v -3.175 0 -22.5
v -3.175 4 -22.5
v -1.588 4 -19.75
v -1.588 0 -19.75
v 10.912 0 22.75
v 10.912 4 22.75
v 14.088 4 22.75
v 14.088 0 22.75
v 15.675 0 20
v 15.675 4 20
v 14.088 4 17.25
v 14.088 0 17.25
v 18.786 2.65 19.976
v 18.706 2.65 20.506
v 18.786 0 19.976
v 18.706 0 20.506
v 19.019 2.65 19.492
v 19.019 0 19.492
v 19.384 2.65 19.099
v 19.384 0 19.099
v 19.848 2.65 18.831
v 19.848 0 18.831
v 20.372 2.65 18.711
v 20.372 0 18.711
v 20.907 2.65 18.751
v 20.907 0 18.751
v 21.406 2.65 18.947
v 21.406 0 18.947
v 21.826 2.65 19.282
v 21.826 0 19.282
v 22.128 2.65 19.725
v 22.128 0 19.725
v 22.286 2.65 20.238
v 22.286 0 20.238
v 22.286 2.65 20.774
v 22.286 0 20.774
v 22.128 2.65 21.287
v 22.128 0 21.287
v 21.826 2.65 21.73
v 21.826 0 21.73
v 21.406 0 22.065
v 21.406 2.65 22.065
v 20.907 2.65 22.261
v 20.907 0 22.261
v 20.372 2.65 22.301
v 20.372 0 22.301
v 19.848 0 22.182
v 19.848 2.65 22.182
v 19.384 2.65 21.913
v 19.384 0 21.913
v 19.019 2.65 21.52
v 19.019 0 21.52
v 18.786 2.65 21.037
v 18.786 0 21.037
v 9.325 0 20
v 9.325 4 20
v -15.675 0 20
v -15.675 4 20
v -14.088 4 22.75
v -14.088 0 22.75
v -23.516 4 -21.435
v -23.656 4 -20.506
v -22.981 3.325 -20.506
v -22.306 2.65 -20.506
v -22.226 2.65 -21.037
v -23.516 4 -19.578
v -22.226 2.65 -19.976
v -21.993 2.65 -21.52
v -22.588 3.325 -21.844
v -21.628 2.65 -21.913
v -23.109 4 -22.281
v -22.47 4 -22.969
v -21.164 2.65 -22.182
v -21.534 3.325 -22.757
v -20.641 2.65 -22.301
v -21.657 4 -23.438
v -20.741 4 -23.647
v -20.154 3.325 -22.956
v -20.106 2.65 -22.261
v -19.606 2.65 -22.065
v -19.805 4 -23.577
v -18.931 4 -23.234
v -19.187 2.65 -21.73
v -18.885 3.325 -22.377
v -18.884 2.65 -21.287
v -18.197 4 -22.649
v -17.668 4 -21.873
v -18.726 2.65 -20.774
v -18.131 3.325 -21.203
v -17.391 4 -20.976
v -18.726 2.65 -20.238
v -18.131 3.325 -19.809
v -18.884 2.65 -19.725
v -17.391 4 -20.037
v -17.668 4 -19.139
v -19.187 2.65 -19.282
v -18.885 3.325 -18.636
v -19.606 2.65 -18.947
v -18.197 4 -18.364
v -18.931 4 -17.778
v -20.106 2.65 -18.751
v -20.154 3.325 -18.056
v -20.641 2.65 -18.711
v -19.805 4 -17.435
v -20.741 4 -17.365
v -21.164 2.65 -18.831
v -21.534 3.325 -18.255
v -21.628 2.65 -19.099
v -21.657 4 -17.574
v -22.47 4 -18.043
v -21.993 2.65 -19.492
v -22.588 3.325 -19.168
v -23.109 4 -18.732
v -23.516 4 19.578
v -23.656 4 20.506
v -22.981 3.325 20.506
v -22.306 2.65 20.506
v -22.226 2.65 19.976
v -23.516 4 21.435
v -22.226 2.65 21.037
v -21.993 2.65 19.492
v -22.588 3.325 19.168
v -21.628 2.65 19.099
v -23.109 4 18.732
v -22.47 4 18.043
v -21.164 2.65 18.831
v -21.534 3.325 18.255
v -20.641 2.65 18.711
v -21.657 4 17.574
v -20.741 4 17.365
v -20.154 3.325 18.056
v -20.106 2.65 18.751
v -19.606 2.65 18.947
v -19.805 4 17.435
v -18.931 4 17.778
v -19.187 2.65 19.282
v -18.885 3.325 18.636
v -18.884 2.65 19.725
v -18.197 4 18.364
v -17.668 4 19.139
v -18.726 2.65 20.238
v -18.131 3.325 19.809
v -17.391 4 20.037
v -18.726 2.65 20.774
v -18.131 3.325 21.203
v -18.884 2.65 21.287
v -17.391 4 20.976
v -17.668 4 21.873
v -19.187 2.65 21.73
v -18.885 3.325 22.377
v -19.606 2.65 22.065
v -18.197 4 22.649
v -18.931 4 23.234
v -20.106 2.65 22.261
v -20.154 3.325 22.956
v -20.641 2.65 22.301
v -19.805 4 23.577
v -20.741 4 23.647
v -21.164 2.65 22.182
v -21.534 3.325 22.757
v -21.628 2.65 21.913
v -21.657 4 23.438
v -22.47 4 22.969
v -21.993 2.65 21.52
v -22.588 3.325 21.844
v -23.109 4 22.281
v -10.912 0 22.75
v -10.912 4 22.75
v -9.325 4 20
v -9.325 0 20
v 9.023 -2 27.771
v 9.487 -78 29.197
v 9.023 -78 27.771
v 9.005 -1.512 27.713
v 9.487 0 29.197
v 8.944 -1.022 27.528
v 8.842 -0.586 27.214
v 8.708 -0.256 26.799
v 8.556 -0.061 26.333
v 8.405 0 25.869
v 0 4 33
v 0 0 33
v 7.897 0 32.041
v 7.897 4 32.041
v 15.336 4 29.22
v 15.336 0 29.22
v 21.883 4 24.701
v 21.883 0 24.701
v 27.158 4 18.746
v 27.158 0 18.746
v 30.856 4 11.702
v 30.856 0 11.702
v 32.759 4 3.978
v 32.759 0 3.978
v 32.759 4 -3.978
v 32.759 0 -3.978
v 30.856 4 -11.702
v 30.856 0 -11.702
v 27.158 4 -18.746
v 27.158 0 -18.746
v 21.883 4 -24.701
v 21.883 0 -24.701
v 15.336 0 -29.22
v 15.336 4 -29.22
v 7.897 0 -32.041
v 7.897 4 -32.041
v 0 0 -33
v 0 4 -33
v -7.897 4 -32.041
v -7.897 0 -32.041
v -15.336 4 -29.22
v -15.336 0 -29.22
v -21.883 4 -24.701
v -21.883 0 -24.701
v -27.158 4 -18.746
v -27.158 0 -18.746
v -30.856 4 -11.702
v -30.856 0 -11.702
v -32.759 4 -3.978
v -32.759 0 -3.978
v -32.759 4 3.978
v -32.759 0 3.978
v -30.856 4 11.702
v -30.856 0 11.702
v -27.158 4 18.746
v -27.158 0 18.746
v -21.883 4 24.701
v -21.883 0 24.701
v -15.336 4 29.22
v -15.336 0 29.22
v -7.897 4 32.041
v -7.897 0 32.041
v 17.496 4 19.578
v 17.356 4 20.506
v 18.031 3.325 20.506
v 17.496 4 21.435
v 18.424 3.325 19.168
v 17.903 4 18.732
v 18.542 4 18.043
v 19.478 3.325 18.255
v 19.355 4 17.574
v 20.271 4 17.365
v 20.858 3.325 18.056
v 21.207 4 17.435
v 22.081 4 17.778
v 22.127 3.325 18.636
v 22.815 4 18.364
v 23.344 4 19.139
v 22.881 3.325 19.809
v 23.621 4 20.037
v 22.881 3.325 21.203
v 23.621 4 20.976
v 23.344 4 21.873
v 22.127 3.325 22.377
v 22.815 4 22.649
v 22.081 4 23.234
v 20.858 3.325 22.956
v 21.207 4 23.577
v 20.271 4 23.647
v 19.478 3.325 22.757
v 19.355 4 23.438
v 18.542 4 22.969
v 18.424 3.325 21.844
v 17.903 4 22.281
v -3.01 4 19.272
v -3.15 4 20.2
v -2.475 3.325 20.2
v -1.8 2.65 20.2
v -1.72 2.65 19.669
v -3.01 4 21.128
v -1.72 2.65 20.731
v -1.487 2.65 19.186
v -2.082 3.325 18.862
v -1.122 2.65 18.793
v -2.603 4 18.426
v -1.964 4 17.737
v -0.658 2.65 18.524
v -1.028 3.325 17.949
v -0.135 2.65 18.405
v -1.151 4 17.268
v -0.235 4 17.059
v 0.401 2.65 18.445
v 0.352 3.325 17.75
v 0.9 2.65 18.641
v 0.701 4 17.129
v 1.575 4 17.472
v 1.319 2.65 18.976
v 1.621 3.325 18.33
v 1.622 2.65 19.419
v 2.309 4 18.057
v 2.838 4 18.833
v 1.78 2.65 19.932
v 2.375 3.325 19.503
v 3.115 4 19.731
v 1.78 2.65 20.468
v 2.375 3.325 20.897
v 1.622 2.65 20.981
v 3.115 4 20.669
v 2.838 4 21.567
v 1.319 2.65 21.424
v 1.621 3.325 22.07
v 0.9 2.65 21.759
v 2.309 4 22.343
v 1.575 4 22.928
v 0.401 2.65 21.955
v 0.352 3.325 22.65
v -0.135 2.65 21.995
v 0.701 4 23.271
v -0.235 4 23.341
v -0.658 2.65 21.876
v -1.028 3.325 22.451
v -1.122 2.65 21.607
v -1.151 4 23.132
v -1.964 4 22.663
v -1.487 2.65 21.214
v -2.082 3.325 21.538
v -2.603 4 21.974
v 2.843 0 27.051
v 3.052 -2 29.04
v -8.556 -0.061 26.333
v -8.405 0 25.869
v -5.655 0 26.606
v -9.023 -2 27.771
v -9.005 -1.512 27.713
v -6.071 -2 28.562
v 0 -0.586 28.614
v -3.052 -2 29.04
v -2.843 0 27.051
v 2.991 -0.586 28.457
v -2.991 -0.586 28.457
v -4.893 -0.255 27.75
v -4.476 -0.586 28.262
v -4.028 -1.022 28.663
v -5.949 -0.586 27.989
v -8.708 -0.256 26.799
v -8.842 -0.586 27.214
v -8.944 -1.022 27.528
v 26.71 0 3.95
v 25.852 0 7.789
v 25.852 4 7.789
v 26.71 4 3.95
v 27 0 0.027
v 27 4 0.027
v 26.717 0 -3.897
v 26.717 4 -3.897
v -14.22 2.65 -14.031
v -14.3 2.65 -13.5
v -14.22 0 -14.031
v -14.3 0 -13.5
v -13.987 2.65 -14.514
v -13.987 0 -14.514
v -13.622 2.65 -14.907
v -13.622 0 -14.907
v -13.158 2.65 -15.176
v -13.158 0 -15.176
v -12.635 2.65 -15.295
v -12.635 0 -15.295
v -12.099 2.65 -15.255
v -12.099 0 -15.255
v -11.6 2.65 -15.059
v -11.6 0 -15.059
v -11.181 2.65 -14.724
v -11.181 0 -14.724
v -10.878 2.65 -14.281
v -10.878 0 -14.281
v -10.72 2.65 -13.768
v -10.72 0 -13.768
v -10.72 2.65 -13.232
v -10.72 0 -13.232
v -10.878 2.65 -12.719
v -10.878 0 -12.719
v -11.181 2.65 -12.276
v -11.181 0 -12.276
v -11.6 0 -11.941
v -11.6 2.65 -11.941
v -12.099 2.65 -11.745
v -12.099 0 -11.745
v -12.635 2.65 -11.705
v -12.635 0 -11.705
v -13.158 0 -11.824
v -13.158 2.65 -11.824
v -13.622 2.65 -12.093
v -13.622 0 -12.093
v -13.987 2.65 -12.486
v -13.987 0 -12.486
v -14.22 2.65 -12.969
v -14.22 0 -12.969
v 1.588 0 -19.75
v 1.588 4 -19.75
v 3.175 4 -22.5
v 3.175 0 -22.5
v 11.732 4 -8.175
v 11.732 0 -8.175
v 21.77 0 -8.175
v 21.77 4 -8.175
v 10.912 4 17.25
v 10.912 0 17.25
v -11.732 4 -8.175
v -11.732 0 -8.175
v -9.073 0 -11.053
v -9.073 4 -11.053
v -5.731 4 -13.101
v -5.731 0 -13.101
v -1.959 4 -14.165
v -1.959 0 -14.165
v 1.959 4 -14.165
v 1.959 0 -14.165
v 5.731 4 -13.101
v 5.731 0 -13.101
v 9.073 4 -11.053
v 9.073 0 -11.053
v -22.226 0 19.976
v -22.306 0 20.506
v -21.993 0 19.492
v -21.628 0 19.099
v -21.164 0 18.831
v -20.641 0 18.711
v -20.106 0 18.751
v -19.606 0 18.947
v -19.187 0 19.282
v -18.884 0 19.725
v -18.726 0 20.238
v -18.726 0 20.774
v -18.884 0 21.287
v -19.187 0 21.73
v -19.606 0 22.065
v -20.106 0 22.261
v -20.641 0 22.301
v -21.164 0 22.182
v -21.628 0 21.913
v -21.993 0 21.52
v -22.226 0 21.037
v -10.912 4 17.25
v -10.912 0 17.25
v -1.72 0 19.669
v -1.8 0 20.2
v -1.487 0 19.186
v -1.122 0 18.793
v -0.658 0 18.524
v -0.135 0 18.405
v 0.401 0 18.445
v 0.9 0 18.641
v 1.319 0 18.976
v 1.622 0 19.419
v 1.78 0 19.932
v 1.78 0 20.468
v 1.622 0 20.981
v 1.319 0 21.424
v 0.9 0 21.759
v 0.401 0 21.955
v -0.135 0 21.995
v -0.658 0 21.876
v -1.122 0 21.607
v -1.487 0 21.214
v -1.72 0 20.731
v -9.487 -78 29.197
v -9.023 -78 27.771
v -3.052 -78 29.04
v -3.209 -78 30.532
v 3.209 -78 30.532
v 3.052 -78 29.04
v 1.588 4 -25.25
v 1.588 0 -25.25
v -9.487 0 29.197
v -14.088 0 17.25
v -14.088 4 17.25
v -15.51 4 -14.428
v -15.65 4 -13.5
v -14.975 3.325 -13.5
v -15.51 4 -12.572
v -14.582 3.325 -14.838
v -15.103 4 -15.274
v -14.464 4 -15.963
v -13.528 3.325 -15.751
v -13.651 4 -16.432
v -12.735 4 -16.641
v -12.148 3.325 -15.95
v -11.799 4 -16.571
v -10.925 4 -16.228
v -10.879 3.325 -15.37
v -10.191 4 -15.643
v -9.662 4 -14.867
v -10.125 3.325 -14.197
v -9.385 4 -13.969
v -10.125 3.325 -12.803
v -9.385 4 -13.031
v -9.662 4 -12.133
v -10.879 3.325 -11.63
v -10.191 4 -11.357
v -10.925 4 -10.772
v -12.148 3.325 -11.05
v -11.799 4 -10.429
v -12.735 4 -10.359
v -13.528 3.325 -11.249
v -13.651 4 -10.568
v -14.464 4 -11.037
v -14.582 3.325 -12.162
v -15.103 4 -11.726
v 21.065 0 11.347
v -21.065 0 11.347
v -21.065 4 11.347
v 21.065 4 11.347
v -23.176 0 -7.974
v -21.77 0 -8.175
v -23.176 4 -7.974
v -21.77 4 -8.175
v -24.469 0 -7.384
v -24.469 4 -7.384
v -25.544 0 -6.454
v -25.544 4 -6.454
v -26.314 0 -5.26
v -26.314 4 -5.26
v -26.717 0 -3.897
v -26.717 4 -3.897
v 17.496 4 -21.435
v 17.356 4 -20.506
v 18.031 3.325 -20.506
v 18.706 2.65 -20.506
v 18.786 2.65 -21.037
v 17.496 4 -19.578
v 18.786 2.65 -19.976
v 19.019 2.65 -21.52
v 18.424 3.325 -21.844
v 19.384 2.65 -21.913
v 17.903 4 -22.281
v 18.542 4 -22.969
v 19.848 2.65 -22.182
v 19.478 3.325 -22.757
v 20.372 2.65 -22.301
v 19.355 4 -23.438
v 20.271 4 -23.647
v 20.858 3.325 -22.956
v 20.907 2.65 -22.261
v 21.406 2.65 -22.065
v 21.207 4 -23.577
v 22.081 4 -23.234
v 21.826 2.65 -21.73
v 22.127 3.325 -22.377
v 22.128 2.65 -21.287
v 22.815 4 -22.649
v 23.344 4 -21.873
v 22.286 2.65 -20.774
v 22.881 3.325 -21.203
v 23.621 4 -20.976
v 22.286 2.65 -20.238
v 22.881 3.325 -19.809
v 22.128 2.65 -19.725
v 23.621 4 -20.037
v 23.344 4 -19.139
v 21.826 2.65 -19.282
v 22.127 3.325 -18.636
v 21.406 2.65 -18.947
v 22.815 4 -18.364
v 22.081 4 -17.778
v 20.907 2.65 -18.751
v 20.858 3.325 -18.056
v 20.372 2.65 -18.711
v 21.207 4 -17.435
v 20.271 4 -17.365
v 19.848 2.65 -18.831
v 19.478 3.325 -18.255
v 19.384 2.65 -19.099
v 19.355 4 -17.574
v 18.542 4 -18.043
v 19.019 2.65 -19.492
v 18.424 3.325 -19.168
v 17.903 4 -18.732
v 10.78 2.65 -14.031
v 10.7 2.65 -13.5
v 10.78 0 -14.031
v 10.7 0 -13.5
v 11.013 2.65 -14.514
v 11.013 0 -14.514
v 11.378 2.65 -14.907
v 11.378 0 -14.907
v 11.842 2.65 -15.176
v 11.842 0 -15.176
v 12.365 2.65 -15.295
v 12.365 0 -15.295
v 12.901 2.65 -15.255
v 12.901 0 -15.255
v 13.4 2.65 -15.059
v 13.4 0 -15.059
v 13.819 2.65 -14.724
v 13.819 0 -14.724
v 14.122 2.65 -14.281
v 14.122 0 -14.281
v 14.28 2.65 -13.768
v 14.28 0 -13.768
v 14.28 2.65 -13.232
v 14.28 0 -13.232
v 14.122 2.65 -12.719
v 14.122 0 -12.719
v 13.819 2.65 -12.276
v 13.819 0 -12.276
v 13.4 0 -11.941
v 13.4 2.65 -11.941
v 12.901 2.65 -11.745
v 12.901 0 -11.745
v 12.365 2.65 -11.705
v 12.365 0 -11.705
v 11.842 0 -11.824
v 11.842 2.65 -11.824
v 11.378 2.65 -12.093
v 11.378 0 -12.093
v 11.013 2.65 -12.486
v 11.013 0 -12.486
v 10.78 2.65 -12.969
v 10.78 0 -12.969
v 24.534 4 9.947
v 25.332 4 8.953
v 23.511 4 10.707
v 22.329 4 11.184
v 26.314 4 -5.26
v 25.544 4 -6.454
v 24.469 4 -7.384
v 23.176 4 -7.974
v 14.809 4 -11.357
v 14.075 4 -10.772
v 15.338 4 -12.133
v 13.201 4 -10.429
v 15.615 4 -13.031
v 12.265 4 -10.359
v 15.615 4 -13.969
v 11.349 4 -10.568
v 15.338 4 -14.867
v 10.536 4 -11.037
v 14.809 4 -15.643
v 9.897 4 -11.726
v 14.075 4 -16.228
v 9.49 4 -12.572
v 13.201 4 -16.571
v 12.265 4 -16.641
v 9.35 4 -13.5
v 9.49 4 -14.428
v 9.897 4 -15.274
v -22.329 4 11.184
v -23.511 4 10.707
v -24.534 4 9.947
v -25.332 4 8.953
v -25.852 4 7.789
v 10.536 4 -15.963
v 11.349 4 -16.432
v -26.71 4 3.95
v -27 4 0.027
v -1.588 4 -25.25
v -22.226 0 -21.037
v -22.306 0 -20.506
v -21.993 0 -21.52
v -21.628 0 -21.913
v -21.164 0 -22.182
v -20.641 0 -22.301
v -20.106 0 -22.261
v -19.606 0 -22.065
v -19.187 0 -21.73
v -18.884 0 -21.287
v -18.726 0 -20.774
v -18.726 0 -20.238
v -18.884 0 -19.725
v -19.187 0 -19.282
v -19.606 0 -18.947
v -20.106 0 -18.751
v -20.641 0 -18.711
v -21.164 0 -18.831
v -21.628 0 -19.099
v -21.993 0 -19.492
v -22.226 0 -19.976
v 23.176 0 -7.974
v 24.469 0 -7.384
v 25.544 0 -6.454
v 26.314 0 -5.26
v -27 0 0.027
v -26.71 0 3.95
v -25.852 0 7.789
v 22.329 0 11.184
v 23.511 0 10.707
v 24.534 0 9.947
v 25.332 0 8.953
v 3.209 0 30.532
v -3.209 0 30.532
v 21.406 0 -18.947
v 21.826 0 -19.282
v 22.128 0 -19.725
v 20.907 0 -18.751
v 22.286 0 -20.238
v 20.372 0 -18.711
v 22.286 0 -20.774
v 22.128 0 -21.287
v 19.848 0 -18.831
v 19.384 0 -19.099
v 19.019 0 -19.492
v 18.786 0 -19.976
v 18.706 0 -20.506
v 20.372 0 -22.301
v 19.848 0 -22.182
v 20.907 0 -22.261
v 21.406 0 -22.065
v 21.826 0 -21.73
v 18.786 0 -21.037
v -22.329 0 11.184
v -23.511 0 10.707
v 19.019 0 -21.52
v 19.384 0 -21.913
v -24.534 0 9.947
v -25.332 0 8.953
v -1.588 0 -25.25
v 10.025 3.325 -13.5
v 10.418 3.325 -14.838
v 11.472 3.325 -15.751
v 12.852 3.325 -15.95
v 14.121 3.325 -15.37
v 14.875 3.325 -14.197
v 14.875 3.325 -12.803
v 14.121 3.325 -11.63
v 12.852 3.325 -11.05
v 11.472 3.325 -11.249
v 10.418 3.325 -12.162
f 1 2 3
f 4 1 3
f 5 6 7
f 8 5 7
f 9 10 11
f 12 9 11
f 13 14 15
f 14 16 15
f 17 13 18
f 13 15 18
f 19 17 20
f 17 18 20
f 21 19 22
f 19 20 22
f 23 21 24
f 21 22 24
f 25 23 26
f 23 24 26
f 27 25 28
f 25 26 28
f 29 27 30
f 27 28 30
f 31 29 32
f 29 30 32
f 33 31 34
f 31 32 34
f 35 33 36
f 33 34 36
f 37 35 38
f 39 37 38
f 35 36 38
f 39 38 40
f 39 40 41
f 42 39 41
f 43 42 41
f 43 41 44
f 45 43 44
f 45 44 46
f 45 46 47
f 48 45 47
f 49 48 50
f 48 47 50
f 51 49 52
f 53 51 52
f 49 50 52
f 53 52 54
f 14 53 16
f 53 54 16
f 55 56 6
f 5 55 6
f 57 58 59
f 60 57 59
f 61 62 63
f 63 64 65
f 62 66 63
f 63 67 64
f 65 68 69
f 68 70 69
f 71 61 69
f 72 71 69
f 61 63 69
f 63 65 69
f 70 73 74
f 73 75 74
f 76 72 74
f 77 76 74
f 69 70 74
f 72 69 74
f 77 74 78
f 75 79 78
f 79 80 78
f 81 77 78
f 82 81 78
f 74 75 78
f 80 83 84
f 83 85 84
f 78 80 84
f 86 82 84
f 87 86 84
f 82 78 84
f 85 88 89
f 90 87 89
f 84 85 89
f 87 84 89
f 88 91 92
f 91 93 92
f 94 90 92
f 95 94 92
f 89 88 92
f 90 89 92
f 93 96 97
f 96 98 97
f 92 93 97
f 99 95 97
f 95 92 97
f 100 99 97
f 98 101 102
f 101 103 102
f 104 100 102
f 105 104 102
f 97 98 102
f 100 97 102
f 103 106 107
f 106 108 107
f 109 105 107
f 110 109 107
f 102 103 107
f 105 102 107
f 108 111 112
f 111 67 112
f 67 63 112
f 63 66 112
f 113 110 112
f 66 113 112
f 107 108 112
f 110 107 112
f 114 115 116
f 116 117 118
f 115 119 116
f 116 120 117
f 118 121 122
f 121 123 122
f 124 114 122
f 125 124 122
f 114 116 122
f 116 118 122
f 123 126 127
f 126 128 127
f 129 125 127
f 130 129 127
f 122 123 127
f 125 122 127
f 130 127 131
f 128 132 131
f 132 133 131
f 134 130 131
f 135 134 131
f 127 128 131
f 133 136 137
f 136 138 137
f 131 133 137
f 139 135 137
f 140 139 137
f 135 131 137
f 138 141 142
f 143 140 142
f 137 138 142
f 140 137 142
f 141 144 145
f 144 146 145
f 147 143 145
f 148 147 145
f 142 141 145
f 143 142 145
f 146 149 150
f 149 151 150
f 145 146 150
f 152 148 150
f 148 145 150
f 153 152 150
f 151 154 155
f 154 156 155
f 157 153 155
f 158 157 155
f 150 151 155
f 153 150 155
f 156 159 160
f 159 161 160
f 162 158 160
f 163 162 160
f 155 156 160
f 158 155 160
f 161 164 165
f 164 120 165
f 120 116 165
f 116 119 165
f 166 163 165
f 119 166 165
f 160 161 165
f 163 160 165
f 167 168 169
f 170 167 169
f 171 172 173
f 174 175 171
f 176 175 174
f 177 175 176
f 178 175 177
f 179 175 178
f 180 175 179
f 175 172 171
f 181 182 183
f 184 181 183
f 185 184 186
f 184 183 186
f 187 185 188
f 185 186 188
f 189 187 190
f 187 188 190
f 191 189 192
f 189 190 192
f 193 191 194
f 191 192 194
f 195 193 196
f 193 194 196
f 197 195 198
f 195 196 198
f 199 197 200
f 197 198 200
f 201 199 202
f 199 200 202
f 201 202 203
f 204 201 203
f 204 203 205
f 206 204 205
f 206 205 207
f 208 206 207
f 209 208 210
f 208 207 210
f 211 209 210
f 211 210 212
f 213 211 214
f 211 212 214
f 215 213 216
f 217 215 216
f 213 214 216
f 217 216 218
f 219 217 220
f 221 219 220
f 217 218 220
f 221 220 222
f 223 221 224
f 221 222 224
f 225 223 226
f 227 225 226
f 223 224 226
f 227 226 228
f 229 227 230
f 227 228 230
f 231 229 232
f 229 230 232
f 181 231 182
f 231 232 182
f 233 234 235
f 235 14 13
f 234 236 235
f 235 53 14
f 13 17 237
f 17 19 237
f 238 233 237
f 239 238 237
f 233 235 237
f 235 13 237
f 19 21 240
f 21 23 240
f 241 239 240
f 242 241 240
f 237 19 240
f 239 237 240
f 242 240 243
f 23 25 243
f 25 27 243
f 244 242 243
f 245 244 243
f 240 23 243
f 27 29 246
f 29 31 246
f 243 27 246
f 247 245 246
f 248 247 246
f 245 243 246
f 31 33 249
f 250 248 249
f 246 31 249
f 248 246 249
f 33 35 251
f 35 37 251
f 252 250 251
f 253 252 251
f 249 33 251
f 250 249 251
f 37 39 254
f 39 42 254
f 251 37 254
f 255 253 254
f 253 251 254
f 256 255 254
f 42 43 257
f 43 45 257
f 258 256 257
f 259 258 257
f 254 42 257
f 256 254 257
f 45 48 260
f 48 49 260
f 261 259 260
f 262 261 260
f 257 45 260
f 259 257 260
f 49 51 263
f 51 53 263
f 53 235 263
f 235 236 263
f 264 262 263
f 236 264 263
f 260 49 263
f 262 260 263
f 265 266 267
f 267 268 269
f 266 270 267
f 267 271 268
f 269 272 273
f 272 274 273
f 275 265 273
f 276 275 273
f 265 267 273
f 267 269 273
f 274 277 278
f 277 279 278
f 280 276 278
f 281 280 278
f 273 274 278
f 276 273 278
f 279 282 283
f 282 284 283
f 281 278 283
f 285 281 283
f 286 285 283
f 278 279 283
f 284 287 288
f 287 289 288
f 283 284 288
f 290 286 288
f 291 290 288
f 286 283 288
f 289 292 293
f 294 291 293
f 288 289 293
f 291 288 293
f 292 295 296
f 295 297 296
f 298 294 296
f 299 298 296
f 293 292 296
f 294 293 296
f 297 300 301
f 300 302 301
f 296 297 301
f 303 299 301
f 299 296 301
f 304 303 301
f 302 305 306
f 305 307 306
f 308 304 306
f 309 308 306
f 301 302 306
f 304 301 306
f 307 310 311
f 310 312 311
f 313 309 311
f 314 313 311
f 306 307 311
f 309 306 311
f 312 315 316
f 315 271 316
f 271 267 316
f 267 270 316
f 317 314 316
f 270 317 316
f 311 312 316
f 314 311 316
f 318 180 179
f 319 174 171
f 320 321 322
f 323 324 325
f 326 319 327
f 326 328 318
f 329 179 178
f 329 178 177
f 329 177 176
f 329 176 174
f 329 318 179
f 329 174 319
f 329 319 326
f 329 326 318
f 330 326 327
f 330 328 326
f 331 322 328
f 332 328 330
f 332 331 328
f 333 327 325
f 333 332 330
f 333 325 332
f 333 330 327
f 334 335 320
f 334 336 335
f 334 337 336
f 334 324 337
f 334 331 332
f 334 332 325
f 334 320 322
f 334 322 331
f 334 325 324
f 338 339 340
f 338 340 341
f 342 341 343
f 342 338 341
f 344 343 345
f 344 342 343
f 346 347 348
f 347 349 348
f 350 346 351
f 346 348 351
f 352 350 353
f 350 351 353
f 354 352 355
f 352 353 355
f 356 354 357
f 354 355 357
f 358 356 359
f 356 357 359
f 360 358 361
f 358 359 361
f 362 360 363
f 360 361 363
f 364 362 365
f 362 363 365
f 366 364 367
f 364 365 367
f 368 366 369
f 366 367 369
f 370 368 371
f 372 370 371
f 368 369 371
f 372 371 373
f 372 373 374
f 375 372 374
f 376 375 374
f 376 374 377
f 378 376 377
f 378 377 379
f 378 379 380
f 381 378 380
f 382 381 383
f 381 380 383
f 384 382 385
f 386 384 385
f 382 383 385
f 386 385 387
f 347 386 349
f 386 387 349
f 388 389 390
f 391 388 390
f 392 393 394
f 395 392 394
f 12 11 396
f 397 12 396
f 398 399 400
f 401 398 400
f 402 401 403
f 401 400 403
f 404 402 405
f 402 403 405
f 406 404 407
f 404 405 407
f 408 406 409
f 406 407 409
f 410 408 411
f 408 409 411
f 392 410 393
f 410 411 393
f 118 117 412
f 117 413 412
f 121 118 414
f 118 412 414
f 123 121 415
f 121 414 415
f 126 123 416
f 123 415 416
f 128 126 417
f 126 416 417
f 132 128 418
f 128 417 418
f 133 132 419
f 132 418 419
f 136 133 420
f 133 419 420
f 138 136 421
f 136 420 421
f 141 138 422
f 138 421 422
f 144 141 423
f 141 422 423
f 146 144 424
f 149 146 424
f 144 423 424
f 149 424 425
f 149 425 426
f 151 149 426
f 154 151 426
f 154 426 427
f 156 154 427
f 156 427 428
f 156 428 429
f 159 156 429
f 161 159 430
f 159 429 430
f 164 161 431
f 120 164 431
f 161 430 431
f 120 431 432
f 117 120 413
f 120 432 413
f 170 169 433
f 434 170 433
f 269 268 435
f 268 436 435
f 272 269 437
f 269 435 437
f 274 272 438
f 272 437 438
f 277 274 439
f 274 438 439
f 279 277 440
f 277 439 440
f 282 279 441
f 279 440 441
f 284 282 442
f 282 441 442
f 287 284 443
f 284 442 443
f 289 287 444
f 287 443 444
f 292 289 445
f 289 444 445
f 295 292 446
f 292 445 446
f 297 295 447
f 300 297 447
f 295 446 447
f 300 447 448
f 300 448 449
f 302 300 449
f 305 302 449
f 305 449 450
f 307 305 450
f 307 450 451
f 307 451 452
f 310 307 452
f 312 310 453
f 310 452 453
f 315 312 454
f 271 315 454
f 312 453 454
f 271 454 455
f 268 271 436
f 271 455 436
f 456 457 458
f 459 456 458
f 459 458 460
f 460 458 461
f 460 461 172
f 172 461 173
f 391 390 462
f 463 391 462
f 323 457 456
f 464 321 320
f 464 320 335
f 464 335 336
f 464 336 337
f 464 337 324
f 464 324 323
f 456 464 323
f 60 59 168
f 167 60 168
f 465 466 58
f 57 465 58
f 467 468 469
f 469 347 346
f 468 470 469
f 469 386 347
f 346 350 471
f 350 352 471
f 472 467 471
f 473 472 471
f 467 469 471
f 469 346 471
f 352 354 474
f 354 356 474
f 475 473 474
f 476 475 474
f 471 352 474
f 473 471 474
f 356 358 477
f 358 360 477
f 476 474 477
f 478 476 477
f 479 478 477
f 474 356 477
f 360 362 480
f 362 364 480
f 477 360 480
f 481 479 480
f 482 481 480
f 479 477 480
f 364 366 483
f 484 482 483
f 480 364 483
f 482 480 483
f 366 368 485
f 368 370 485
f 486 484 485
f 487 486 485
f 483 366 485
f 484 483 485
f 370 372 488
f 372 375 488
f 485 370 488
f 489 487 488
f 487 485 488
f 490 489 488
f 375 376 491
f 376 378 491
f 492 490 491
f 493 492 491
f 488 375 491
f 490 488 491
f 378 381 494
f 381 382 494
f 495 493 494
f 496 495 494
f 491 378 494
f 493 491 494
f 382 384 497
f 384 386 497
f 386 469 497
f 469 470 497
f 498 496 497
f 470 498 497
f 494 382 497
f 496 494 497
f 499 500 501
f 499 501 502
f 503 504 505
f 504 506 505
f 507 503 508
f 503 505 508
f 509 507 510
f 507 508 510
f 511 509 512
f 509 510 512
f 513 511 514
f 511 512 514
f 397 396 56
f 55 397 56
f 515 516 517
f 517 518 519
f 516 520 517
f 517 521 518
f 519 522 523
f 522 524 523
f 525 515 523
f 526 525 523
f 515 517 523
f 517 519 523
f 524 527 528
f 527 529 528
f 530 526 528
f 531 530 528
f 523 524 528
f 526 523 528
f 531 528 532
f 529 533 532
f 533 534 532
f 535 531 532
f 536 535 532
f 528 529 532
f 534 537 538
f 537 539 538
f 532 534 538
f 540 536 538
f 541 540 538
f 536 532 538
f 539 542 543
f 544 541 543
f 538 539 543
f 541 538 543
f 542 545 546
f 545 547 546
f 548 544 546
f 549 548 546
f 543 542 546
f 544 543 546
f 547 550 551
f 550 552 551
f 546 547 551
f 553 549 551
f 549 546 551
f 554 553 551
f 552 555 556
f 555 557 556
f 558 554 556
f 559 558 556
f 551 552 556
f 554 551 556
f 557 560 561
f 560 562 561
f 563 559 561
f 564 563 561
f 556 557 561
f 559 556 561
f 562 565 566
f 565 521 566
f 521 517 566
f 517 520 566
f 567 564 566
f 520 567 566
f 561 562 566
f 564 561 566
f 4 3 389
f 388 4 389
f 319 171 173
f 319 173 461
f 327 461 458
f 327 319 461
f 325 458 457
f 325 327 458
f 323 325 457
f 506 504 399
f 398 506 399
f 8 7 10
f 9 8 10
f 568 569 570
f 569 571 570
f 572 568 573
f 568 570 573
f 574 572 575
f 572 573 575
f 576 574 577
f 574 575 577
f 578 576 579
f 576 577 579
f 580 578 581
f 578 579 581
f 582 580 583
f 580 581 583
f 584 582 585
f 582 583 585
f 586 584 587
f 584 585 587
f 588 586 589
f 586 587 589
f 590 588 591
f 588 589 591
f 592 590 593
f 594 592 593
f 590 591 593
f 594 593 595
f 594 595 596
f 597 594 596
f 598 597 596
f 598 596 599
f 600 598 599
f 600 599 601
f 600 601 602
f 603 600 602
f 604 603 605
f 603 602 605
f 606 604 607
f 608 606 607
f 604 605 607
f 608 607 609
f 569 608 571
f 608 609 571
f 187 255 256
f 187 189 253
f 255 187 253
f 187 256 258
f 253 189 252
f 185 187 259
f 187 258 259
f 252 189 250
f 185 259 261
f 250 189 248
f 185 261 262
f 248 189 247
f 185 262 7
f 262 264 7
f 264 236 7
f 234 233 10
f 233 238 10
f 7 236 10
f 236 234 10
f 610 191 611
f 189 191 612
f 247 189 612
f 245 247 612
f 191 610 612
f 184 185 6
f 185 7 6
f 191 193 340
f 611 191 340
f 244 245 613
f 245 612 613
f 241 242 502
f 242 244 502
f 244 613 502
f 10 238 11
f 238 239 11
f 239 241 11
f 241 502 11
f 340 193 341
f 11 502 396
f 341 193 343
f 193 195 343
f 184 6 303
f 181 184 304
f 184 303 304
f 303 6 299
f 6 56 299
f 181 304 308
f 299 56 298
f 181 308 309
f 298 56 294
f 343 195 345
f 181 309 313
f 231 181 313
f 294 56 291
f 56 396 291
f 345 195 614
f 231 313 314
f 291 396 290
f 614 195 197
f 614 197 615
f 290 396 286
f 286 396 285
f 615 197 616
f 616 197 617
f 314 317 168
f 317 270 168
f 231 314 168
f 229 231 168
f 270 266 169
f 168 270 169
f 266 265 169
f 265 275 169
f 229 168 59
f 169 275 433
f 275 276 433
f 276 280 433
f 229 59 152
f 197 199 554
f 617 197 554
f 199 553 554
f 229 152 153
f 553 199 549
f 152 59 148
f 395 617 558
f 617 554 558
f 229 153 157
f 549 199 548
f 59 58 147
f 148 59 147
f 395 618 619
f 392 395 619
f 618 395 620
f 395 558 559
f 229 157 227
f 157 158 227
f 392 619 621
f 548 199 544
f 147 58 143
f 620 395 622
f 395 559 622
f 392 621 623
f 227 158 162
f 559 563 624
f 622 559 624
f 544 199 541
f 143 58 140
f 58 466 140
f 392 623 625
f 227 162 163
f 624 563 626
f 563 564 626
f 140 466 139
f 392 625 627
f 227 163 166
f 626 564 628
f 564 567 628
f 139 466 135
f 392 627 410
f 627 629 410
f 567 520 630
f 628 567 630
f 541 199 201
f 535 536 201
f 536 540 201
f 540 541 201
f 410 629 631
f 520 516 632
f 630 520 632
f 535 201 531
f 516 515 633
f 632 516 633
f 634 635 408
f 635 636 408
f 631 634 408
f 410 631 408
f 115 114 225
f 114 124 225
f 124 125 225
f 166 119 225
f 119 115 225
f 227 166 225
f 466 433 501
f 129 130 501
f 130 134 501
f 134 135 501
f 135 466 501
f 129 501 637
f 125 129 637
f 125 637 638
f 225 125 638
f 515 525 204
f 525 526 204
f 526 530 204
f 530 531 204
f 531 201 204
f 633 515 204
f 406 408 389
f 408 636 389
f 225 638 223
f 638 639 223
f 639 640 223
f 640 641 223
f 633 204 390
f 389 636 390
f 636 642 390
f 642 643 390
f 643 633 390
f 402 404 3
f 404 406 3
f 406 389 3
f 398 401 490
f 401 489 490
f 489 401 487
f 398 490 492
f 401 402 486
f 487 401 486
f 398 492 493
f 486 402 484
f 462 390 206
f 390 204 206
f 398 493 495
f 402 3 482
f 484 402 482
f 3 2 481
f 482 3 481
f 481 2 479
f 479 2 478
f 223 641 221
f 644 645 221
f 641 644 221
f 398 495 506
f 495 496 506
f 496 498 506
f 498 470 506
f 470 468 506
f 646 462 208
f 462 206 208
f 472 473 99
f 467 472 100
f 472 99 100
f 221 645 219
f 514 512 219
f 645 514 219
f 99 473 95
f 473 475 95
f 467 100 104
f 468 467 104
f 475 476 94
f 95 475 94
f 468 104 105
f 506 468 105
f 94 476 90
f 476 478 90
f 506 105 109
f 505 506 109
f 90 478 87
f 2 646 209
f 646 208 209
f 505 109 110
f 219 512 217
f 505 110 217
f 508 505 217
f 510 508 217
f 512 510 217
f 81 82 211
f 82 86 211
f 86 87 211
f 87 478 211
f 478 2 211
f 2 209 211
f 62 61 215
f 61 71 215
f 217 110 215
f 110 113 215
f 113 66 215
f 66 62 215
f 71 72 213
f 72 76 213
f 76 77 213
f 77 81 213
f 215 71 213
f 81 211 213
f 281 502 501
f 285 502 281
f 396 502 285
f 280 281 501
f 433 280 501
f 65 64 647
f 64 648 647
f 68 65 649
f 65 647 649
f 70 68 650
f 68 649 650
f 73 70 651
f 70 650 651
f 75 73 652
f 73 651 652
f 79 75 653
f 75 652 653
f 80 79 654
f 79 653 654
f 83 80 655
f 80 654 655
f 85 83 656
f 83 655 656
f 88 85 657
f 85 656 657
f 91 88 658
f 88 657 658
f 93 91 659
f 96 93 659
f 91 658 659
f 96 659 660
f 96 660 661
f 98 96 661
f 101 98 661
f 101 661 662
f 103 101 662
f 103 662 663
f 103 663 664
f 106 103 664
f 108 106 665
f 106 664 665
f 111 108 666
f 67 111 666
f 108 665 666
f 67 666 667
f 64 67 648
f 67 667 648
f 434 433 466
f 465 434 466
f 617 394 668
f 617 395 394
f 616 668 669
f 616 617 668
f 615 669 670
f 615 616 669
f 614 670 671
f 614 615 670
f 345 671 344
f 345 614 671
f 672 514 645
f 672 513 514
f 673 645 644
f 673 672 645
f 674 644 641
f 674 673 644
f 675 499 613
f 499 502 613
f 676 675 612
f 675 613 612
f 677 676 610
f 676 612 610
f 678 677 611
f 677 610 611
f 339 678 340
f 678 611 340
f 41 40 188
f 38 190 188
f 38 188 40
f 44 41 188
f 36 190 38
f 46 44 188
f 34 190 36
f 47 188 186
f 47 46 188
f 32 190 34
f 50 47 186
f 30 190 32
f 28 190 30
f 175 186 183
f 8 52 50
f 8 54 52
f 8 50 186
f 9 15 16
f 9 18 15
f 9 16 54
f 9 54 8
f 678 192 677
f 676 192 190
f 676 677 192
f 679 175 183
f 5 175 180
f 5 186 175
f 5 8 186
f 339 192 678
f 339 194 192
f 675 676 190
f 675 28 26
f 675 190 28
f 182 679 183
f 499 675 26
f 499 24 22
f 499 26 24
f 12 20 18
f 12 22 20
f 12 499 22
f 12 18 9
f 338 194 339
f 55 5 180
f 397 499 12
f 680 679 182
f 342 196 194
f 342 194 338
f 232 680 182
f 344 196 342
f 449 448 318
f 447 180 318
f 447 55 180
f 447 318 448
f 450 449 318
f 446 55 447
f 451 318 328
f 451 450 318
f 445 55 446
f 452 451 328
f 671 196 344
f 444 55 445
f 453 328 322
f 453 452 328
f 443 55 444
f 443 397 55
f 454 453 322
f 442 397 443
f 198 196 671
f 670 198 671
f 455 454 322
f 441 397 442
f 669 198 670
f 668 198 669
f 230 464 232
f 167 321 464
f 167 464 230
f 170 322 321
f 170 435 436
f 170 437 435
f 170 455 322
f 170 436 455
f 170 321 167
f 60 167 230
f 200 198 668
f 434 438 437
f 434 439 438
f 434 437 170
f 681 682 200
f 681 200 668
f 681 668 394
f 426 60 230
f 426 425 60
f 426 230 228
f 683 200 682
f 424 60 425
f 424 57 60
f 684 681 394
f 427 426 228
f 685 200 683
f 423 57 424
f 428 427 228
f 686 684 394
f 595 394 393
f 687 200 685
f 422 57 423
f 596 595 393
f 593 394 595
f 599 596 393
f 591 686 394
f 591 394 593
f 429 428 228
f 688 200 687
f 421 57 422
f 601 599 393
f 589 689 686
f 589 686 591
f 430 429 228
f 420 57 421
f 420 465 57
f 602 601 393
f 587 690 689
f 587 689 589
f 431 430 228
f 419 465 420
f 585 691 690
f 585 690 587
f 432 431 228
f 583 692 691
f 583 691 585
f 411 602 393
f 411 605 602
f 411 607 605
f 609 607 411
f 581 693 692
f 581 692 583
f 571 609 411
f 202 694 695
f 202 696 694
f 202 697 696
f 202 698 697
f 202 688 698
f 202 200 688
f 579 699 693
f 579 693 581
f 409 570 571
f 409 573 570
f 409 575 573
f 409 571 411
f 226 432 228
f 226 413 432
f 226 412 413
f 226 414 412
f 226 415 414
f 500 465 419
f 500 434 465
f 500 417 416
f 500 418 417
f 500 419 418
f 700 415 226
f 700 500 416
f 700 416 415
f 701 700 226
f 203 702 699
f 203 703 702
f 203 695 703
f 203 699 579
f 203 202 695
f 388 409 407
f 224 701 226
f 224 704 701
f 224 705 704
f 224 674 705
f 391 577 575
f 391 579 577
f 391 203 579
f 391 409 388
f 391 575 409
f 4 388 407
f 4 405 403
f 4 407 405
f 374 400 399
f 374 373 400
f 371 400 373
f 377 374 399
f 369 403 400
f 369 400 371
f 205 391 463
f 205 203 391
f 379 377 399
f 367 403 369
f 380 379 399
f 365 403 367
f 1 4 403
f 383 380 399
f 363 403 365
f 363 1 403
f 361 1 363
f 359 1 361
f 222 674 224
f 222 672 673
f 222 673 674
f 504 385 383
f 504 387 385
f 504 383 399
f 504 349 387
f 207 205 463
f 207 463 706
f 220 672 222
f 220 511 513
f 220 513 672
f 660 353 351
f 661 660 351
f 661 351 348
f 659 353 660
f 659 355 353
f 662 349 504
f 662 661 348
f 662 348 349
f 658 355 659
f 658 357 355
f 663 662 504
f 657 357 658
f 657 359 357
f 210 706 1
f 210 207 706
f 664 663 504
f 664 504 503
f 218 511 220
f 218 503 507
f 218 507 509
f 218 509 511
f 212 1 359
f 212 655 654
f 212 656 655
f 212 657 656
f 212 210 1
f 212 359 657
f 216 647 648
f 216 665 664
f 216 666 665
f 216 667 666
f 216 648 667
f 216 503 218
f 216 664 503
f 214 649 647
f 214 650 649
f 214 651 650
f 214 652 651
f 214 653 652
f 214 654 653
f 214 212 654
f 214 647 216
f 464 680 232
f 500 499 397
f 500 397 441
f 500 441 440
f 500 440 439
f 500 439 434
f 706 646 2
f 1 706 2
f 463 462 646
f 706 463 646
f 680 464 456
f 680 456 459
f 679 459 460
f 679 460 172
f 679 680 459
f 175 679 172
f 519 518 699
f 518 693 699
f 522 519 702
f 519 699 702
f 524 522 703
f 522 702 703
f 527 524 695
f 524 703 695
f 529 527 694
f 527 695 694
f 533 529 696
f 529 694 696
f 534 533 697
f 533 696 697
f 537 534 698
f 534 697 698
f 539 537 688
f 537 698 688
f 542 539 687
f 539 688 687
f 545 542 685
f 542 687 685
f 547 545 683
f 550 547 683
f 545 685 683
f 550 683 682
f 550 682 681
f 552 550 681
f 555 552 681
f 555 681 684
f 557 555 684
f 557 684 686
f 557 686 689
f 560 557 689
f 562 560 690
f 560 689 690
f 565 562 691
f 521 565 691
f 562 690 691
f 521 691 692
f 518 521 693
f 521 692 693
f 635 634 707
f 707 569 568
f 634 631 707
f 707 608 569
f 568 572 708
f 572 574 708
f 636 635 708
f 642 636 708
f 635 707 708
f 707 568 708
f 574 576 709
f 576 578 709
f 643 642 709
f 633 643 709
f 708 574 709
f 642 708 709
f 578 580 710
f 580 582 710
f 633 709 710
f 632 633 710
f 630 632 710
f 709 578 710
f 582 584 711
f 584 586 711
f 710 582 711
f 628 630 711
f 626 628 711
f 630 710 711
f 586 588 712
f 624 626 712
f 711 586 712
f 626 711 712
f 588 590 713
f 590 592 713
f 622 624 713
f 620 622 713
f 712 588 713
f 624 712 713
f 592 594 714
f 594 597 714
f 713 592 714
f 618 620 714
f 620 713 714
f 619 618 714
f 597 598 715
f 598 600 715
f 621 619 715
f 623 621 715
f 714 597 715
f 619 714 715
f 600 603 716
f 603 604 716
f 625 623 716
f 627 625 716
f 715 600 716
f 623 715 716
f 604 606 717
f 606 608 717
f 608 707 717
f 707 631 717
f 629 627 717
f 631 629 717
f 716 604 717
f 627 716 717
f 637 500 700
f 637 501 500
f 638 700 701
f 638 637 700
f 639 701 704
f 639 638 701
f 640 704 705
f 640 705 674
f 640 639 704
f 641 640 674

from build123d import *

# Parameters (mm, degrees)
SKETCH1_R                                       = 33
SKETCH1_R_2                                     = 27
BOSS_EXTRUDE1_DEPTH                             = 4
SALIENTE_EXTRUIR1_START                         = -4
SKETCH2_R                                       = 1.5
SALIENTE_EXTRUIR1_DEPTH                         = 4
CORTAR_EXTRUIR1_REACH                           = 48.84
CROQUIS1_R                                      = 1.75
CSK_FOR_M3_FLAT_HEAD_MACHINE_SCREW1_D           = 3.6
CSK_FOR_M3_FLAT_HEAD_MACHINE_SCREW1_CSINK_D     = 6.3
CSK_FOR_M3_FLAT_HEAD_MACHINE_SCREW1_CSINK_ANGLE = 90
CSK_FOR_M3_FLAT_HEAD_MACHINE_SCREW2_D           = 3.6
CSK_FOR_M3_FLAT_HEAD_MACHINE_SCREW2_CSINK_D     = 6.3
CSK_FOR_M3_FLAT_HEAD_MACHINE_SCREW2_CSINK_ANGLE = 90
FILLET1_R                                       = 5
BOSS_EXTRUDE2_DEPTH                             = 78
FILLET2_R                                       = 2


with BuildPart() as part:
    # Sketch1 → Boss-Extrude1 (new body)
    with BuildSketch(Plane(origin=(0, 0, 0), x_dir=(1, 0, 0), z_dir=(0, 1, 0))):
        with Locations(Location((0, 0, 0), (0, 0, 270))):
            Circle(SKETCH1_R)
        with Locations(Location((0, 0, 0), (0, 0, 270))):
            Circle(SKETCH1_R_2, mode=Mode.SUBTRACT)
    extrude(amount=BOSS_EXTRUDE1_DEPTH)

    # Sketch2 → Saliente-Extruir1 (add)
    # profile 1 of 2: a face of its own
    with BuildSketch(Plane(origin=(0, 4, 0), x_dir=(1, 0, 0), z_dir=(0, 1, 0)).offset(SALIENTE_EXTRUIR1_START)):
        with BuildLine():
            Line((-24.5, -11.346805718), (24.5, -11.346805718))
            ThreePointArc((24.5, -11.346805718), (0, -27), (-24.5, -11.346805718))
        make_face()
        with Locations(Location((0, -20.2, 0), (0, 0, 270))):
            Circle(SKETCH2_R, mode=Mode.SUBTRACT)
    # profile 2 of 2: a face of its own
    with BuildSketch(Plane(origin=(0, 4, 0), x_dir=(1, 0, 0), z_dir=(0, 1, 0)).offset(SALIENTE_EXTRUIR1_START)):
        with BuildLine():
            Line((-25.7325, 8.175478197), (-11.7325, 8.175478197))
            ThreePointArc((-11.7325, 8.175478197), (0, 14.3), (11.7325, 8.175478197))
            Line((11.7325, 8.175478197), (25.7325, 8.175478197))
            ThreePointArc((25.7325, 8.175478197), (0, 27), (-25.7325, 8.175478197))
        make_face()
        with Locations(Location((-12.5, 13.5, 0), (0, 0, 270))):
            Circle(SKETCH2_R, mode=Mode.SUBTRACT)
        with Locations(Location((12.5, 13.5, 0), (0, 0, 270))):
            Circle(SKETCH2_R, mode=Mode.SUBTRACT)
    extrude(amount=SALIENTE_EXTRUIR1_DEPTH)

    # Croquis1 → Cortar-Extruir1 (cut, up to next)
    with BuildSketch(Plane(origin=(0, 4, 0), x_dir=(1, 0, 0), z_dir=(0, 1, 0)), mode=Mode.PRIVATE) as cortar_extruir1_sk1:
        with Locations(Location((-20.506096654, 20.506096654, 0), (0, 0, 270))):
            Circle(CROQUIS1_R)
    cortar_extruir1_tool1 = extrude(cortar_extruir1_sk1.sketch, amount=-CORTAR_EXTRUIR1_REACH, mode=Mode.PRIVATE) & part.part
    # Croquis1 → Cortar-Extruir1 (cut, up to next)
    with BuildSketch(Plane(origin=(0, 4, 0), x_dir=(1, 0, 0), z_dir=(0, 1, 0)), mode=Mode.PRIVATE) as cortar_extruir1_sk2:
        with Locations(Location((20.506096654, 20.506096654, 0), (0, 0, 270))):
            Circle(CROQUIS1_R)
    cortar_extruir1_tool2 = extrude(cortar_extruir1_sk2.sketch, amount=-CORTAR_EXTRUIR1_REACH, mode=Mode.PRIVATE) & part.part
    # Croquis1 → Cortar-Extruir1 (cut, up to next)
    with BuildSketch(Plane(origin=(0, 4, 0), x_dir=(1, 0, 0), z_dir=(0, 1, 0)), mode=Mode.PRIVATE) as cortar_extruir1_sk3:
        with Locations(Location((-20.506096654, -20.506096654, 0), (0, 0, 270))):
            Circle(CROQUIS1_R)
    cortar_extruir1_tool3 = extrude(cortar_extruir1_sk3.sketch, amount=-CORTAR_EXTRUIR1_REACH, mode=Mode.PRIVATE) & part.part
    # Croquis1 → Cortar-Extruir1 (cut, up to next)
    with BuildSketch(Plane(origin=(0, 4, 0), x_dir=(1, 0, 0), z_dir=(0, 1, 0)), mode=Mode.PRIVATE) as cortar_extruir1_sk4:
        with Locations(Location((20.506096654, -20.506096654, 0), (0, 0, 270))):
            Circle(CROQUIS1_R)
    cortar_extruir1_tool4 = extrude(cortar_extruir1_sk4.sketch, amount=-CORTAR_EXTRUIR1_REACH, mode=Mode.PRIVATE) & part.part
    # Croquis1 → Cortar-Extruir1 (cut, up to next)
    with BuildSketch(Plane(origin=(0, 4, 0), x_dir=(1, 0, 0), z_dir=(0, 1, 0)), mode=Mode.PRIVATE) as cortar_extruir1_sk5:
        Polygon((-9.324573519, -20), (-10.91228676, -17.25), (-14.08771324, -17.25), (-15.675426481, -20), (-14.08771324, -22.75), (-10.91228676, -22.75), align=None)
    cortar_extruir1_tool5 = extrude(cortar_extruir1_sk5.sketch, amount=-CORTAR_EXTRUIR1_REACH, mode=Mode.PRIVATE) & part.part
    # Croquis1 → Cortar-Extruir1 (cut, up to next)
    with BuildSketch(Plane(origin=(0, 4, 0), x_dir=(1, 0, 0), z_dir=(0, 1, 0)), mode=Mode.PRIVATE) as cortar_extruir1_sk6:
        Polygon((15.675426481, -20), (14.08771324, -17.25), (10.91228676, -17.25), (9.324573519, -20), (10.91228676, -22.75), (14.08771324, -22.75), align=None)
    cortar_extruir1_tool6 = extrude(cortar_extruir1_sk6.sketch, amount=-CORTAR_EXTRUIR1_REACH, mode=Mode.PRIVATE) & part.part
    # Croquis1 → Cortar-Extruir1 (cut, up to next)
    with BuildSketch(Plane(origin=(0, 4, 0), x_dir=(1, 0, 0), z_dir=(0, 1, 0)), mode=Mode.PRIVATE) as cortar_extruir1_sk7:
        Polygon((3.175426481, 22.5), (1.58771324, 25.25), (-1.58771324, 25.25), (-3.175426481, 22.5), (-1.58771324, 19.75), (1.58771324, 19.75), align=None)
    cortar_extruir1_tool7 = extrude(cortar_extruir1_sk7.sketch, amount=-CORTAR_EXTRUIR1_REACH, mode=Mode.PRIVATE) & part.part
    add(cortar_extruir1_tool1.solids().sort_by_distance((-20.506097, 4, -20.506097))[0], mode=Mode.SUBTRACT)
    add(cortar_extruir1_tool2.solids().sort_by_distance((20.506097, 4, -20.506097))[0], mode=Mode.SUBTRACT)
    add(cortar_extruir1_tool3.solids().sort_by_distance((-20.506097, 4, 20.506097))[0], mode=Mode.SUBTRACT)
    add(cortar_extruir1_tool4.solids().sort_by_distance((20.506097, 4, 20.506097))[0], mode=Mode.SUBTRACT)
    add(cortar_extruir1_tool5.solids().sort_by_distance((-12.5, 4, 20))[0], mode=Mode.SUBTRACT)
    add(cortar_extruir1_tool6.solids().sort_by_distance((12.5, 4, 20))[0], mode=Mode.SUBTRACT)
    add(cortar_extruir1_tool7.solids().sort_by_distance((0, 4, -22.5))[0], mode=Mode.SUBTRACT)

    # CSK for M3 Flat Head Machine Screw1 (through all)
    with Locations(Plane(origin=(0, 4, 0), x_dir=(1, 0, 0), z_dir=(0, 1, 0))):
        with Locations((-20.506096654, 20.506096654), (20.506096654, 20.506096654), (20.506096654, -20.506096654), (-20.506096654, -20.506096654)):
            CounterSinkHole(CSK_FOR_M3_FLAT_HEAD_MACHINE_SCREW1_D / 2, CSK_FOR_M3_FLAT_HEAD_MACHINE_SCREW1_CSINK_D / 2, counter_sink_angle=CSK_FOR_M3_FLAT_HEAD_MACHINE_SCREW1_CSINK_ANGLE)

    # CSK for M3 Flat Head Machine Screw2 (through all)
    with Locations(Plane(origin=(0, 4, 0), x_dir=(1, 0, 0), z_dir=(0, 1, 0))):
        with Locations((-12.5, 13.5), (12.5, 13.5), (0, -20.2)):
            CounterSinkHole(CSK_FOR_M3_FLAT_HEAD_MACHINE_SCREW2_D / 2, CSK_FOR_M3_FLAT_HEAD_MACHINE_SCREW2_CSINK_D / 2, counter_sink_angle=CSK_FOR_M3_FLAT_HEAD_MACHINE_SCREW2_CSINK_ANGLE)

    # Fillet1
    fillet1_edges = [part.edges().sort_by_distance(p)[0] for p in [
        (-25.7325, 2, -8.175478197),
        (25.7325, 2, -8.175478197),
        (24.5, 2, 11.346805718),
        (-24.5, 2, 11.346805718),
    ]]
    fillet(fillet1_edges, radius=FILLET1_R)

    # Sketch8 → Boss-Extrude2 (add)
    with BuildSketch(Plane(origin=(0, 0, 0), x_dir=(-1, 0, 0), z_dir=(0, -1, 0))):
        with BuildLine():
            Line((-9.486821727, -29.19743505), (-9.023296236, -27.770850276))
            ThreePointArc((-9.023296236, -27.770850276), (0, -29.2), (9.023296236, -27.770850276))
            Line((9.023296236, -27.770850276), (9.486821727, -29.19743505))
            ThreePointArc((9.486821727, -29.19743505), (0, -30.7), (-9.486821727, -29.19743505))
        make_face()
    extrude(amount=BOSS_EXTRUDE2_DEPTH)

    # Fillet2
    fillet2_edges = [part.edges().sort_by_distance(p)[0] for p in [
        (0, 0, 29.2),
    ]]
    fillet(fillet2_edges, radius=FILLET2_R)


solid = part.part
